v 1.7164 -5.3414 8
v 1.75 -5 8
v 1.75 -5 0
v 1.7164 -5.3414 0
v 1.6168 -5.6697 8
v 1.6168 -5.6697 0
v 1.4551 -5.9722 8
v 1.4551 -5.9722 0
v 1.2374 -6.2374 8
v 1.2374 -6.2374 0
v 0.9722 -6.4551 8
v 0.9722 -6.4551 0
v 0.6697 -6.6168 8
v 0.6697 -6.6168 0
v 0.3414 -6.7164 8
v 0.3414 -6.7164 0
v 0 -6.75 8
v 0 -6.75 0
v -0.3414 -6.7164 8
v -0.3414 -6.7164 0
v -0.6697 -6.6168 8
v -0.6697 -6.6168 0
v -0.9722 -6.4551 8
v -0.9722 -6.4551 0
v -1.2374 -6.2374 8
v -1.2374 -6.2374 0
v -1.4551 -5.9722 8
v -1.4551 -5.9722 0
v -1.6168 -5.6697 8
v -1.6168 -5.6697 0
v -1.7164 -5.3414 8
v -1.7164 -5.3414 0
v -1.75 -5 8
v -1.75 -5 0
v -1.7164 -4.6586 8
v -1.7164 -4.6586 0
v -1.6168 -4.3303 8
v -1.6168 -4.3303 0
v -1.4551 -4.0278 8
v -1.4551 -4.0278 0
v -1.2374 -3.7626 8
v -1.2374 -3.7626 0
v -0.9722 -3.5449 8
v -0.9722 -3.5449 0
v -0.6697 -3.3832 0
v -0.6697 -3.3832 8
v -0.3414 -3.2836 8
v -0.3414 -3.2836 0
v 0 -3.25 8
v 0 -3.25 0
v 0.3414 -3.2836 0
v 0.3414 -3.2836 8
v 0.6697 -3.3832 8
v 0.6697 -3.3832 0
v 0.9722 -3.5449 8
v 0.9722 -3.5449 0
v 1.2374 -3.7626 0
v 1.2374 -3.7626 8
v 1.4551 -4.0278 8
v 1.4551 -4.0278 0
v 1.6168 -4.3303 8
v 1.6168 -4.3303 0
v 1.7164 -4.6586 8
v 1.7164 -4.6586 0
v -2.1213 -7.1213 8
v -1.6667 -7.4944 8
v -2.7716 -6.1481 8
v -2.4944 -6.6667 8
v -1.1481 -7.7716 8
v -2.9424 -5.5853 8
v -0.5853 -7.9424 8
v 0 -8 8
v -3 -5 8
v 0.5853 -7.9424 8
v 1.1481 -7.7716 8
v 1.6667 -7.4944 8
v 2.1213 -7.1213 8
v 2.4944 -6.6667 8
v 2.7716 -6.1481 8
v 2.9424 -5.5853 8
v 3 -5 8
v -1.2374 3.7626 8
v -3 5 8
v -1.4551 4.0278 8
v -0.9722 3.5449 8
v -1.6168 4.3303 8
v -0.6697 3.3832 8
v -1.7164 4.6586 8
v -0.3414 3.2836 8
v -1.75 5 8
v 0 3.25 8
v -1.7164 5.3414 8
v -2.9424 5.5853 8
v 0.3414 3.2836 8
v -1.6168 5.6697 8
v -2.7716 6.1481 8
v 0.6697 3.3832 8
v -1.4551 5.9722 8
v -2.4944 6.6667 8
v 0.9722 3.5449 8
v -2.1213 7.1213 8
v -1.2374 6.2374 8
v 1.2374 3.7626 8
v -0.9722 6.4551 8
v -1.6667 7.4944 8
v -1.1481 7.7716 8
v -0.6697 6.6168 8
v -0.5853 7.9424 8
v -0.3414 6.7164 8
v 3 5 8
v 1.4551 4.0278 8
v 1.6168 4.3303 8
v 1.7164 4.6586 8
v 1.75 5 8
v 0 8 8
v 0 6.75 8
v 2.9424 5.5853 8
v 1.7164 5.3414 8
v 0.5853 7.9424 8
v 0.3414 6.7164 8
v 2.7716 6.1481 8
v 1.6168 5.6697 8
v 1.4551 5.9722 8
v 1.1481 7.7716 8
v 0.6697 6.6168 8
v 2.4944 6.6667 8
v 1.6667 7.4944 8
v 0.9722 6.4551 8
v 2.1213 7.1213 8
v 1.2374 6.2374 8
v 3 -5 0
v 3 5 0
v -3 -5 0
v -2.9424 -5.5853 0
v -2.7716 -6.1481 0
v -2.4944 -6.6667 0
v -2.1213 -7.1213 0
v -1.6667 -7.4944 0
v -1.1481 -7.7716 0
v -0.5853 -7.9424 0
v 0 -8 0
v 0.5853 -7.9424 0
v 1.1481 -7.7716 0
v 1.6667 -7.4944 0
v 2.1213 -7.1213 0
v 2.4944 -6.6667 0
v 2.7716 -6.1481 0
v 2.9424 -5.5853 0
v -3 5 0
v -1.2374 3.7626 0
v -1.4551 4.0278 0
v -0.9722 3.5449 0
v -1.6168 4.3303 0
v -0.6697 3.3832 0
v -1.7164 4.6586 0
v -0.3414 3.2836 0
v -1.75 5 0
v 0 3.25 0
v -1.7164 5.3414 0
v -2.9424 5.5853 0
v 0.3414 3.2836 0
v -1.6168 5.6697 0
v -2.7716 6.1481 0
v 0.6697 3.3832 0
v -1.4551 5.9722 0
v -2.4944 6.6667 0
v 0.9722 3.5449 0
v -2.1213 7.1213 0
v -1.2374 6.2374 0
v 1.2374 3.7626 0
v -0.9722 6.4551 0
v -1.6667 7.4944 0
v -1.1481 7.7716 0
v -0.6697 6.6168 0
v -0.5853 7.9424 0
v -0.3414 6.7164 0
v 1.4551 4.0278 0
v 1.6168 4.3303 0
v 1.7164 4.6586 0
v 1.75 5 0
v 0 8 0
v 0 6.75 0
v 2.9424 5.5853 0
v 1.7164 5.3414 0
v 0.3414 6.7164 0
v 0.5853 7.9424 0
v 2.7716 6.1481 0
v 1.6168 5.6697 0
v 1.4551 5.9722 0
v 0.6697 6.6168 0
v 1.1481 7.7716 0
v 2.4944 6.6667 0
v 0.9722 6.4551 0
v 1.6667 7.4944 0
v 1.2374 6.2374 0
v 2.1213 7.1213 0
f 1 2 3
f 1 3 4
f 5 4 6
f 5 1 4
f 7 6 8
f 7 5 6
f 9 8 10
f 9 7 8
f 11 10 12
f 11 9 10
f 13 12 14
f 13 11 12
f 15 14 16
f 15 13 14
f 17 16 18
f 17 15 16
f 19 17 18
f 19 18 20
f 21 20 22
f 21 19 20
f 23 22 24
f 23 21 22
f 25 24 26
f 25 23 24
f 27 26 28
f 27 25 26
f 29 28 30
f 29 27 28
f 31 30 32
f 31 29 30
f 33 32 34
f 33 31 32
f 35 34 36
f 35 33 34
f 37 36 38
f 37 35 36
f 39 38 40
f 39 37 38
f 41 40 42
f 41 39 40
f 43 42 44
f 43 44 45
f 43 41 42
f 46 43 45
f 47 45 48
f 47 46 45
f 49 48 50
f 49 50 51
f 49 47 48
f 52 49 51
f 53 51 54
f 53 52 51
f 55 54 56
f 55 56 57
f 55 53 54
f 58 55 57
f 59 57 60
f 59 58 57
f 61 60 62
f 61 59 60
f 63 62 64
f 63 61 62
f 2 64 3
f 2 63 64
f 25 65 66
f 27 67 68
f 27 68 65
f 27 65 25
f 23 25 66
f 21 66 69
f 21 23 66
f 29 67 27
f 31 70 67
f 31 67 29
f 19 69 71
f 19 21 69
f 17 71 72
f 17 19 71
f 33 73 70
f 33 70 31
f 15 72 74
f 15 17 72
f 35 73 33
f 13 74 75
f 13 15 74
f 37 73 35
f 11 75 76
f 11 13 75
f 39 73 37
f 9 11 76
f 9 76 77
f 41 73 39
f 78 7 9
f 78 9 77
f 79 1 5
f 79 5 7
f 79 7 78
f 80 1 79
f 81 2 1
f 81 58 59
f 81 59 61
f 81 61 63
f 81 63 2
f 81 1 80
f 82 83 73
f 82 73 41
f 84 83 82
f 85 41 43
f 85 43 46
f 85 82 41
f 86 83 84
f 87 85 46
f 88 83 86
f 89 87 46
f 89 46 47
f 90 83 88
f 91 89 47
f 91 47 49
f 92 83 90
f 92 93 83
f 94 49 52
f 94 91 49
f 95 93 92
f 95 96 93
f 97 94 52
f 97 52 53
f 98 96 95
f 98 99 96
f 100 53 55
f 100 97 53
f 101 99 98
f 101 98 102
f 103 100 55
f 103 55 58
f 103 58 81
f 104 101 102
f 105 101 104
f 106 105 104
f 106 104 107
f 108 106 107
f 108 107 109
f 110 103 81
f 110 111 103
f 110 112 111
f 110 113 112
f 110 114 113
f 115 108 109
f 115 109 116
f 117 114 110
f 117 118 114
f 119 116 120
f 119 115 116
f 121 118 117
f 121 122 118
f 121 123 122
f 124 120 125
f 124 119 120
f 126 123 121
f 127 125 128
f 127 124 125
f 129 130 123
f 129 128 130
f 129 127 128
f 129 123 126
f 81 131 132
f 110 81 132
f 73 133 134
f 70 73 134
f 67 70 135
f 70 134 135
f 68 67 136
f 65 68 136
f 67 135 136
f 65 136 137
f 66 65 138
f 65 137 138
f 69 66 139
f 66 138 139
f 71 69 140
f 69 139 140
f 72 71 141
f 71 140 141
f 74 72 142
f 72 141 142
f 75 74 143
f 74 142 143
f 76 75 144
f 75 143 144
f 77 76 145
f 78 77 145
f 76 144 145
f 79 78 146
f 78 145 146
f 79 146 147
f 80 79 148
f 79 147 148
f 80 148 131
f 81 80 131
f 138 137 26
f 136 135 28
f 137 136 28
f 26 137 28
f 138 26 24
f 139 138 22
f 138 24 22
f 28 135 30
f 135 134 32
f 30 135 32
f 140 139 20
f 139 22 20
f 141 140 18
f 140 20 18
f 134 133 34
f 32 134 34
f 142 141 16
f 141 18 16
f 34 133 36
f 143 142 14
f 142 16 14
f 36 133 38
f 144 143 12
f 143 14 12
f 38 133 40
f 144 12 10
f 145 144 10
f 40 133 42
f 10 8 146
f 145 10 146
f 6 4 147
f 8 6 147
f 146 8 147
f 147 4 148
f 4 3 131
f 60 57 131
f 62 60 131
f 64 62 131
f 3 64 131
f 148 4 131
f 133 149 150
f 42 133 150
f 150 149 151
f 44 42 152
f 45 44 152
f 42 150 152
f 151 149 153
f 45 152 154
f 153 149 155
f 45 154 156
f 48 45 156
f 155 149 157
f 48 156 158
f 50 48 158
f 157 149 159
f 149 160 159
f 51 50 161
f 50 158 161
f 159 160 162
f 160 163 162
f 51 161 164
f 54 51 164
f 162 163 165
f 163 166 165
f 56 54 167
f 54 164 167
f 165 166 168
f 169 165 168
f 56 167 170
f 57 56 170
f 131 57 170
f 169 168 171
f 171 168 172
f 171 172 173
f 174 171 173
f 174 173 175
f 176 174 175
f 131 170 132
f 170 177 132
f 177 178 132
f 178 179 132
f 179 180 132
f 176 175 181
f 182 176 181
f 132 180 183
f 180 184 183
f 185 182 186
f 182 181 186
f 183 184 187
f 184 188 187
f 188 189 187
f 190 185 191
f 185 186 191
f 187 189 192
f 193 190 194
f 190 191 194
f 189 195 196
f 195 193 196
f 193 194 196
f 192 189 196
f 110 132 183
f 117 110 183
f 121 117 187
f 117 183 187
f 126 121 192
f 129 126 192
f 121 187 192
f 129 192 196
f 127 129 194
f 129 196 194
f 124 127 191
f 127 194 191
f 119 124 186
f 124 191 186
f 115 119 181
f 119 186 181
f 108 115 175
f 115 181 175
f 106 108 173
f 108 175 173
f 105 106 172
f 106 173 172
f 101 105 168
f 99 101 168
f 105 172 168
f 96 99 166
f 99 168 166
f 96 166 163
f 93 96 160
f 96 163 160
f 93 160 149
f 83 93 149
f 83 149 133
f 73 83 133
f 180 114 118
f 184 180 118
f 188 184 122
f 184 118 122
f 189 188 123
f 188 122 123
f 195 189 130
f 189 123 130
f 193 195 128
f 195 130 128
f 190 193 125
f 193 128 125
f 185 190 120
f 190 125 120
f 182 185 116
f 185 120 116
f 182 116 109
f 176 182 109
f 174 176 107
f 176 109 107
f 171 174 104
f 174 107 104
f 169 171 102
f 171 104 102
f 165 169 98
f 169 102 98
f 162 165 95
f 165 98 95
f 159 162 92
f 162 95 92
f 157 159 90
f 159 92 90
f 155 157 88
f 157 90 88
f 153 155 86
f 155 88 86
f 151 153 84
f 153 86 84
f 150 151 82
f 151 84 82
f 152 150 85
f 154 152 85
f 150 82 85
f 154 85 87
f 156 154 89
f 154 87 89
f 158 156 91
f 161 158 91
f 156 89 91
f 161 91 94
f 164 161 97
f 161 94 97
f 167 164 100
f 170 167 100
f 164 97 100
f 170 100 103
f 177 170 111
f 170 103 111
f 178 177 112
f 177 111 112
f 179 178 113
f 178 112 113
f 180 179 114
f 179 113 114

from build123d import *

# Parameters (mm, degrees)
BOSS_EXTRUDE1_DEPTH      = 8
SCHIZZO1_R               = 1.75
TAGLIO_ESTRUSIONE1_DEPTH = 8


with BuildPart() as part:
    # Sketch1 → Boss-Extrude1 (new body)
    with BuildSketch(Plane.XY):
        with BuildLine():
            Line((-3, 5), (-3, -5))
            ThreePointArc((-3, -5), (0, -8), (3, -5))
            Line((3, -5), (3, 5))
            ThreePointArc((3, 5), (0, 8), (-3, 5))
        make_face()
    extrude(amount=BOSS_EXTRUDE1_DEPTH)

    # Schizzo1 → Taglio-Estrusione1 (cut)
    with BuildSketch(Plane.XY.offset(8)):
        with Locations((0, 5)):
            Circle(SCHIZZO1_R)
    taglio_estrusione1 = extrude(amount=-TAGLIO_ESTRUSIONE1_DEPTH, mode=Mode.SUBTRACT)

    # Specchia1: Taglio-Estrusione1 across plane
    add(taglio_estrusione1.mirror(Plane.ZX), mode=Mode.SUBTRACT)


solid = part.part
